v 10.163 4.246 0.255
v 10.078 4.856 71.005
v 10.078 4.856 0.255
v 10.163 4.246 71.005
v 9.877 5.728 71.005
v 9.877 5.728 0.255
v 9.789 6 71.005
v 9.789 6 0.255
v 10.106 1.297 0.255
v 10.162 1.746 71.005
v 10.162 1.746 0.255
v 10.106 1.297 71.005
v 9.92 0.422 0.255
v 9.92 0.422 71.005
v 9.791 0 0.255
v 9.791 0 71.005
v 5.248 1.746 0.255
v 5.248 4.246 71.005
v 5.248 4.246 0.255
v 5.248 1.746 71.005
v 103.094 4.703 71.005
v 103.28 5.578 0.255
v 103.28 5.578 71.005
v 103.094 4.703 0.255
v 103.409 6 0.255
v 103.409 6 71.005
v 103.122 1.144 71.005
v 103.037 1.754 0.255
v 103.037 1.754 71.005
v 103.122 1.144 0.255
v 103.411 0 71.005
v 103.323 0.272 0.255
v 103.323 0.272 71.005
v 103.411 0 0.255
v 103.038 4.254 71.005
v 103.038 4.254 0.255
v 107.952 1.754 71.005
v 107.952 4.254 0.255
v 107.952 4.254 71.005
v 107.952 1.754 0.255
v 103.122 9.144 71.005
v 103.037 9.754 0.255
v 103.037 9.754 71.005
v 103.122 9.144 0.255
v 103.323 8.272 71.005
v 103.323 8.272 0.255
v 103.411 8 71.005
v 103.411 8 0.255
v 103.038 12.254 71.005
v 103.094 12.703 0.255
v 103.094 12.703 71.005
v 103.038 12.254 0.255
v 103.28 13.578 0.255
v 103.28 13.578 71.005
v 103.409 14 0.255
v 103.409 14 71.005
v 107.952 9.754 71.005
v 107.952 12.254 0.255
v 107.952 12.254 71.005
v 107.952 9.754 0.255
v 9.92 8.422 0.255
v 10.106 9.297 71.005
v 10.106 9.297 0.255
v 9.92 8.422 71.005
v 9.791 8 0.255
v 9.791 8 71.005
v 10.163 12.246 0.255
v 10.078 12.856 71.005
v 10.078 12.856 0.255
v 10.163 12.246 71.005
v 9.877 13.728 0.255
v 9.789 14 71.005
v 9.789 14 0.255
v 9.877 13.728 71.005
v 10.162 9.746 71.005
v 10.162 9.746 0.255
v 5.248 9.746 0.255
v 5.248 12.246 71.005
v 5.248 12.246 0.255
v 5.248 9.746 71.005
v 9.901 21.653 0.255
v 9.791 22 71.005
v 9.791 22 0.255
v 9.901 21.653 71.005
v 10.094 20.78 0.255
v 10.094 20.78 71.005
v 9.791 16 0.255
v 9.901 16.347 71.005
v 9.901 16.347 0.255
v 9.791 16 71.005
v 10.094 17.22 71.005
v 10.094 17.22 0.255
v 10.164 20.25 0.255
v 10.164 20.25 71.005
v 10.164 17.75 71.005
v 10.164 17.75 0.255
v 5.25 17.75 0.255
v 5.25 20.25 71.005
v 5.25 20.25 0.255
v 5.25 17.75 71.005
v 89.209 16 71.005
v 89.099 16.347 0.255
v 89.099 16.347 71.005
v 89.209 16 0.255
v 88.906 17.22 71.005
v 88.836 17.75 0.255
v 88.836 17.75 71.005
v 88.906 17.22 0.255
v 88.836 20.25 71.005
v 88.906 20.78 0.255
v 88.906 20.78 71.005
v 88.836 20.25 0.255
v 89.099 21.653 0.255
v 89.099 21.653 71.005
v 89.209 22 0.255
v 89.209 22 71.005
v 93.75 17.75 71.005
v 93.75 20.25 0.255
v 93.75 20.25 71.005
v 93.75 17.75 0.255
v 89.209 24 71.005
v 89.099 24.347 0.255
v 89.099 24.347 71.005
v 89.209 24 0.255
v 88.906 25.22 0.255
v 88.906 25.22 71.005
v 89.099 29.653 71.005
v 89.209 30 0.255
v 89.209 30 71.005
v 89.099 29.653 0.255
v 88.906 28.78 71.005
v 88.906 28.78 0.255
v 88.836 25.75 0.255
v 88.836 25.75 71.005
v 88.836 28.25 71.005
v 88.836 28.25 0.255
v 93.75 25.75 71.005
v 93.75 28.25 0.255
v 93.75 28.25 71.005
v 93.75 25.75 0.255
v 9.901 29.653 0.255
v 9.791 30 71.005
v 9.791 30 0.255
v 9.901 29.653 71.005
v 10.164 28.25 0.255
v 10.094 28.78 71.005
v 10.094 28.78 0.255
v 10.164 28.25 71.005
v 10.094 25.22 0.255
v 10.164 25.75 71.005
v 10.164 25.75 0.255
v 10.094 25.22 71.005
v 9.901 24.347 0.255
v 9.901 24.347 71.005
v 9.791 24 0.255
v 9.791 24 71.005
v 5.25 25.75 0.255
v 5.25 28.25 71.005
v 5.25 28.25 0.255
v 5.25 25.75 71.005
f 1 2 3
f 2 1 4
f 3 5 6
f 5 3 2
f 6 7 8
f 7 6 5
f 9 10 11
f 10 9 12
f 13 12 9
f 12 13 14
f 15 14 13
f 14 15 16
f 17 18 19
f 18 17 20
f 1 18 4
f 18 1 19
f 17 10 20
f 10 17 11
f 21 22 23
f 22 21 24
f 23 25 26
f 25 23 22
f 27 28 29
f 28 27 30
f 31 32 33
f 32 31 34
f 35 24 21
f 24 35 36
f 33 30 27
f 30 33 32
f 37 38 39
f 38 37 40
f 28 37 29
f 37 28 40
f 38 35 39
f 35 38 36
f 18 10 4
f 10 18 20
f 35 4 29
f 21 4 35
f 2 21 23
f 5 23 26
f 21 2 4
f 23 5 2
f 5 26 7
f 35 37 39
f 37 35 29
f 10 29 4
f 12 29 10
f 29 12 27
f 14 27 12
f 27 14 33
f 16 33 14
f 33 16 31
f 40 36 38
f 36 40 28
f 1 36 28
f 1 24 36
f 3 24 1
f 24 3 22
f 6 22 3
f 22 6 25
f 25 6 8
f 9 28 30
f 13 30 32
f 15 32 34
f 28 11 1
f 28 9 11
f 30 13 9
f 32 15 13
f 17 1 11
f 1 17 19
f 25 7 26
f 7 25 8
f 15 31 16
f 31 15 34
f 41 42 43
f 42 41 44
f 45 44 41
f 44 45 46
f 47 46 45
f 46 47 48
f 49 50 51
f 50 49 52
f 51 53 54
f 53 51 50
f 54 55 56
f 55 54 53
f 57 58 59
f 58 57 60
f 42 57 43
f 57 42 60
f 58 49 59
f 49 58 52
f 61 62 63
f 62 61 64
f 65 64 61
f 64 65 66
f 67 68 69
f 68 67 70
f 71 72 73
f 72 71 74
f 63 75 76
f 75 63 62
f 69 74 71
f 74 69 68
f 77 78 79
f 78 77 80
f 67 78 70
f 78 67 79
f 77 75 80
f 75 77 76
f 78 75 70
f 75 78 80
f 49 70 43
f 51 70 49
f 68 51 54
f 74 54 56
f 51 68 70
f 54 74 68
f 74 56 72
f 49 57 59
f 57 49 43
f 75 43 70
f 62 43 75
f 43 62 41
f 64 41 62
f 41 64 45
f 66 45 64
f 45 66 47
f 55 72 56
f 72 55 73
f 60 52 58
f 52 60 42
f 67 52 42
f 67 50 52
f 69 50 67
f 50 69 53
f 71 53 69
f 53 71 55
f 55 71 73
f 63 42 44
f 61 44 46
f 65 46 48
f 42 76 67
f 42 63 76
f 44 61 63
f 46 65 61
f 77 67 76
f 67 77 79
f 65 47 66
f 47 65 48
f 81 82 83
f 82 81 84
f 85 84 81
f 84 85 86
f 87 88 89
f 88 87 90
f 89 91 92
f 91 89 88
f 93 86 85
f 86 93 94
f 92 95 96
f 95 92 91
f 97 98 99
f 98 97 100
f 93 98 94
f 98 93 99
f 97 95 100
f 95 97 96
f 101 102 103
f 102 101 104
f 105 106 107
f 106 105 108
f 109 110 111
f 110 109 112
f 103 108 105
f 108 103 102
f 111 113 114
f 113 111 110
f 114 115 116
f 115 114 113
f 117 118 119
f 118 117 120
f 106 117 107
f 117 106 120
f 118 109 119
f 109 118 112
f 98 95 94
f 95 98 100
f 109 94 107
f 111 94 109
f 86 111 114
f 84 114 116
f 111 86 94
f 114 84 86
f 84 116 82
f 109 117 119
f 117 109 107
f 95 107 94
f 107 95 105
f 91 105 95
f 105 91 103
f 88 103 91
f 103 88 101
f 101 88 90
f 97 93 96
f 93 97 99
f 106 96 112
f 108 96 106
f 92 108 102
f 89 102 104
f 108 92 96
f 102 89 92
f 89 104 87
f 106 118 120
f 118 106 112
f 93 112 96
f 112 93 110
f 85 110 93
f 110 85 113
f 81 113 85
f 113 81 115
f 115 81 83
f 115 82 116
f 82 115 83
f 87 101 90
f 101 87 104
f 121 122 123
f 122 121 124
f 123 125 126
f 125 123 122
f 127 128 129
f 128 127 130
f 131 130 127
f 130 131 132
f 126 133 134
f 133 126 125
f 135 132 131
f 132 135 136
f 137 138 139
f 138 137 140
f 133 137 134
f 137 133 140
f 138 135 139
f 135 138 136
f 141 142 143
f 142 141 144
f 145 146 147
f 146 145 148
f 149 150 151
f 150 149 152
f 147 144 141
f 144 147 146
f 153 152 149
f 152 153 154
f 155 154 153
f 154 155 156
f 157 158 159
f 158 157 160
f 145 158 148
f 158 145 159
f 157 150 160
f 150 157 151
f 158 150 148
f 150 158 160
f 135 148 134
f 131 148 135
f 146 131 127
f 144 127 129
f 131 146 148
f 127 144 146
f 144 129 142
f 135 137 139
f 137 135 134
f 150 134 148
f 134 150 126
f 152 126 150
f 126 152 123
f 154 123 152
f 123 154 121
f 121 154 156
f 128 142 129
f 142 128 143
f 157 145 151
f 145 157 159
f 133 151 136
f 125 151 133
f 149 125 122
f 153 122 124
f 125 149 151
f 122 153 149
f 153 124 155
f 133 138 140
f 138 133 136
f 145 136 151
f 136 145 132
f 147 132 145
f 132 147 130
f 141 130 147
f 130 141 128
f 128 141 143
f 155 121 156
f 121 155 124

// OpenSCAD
union(){
	translate([56.60, 3.00, 35.63]){
	rotate(0.46,[0,0,1]){
	translate([0.00, 0.00, 0.00]){
	scale([1.000, 1.000, 70.750]){
	difference(){
	rotate(-0.46,[0,0,1]){
	cube([113.20,6.00,1.00], true);
}	translate([-56.60, 0.45, -37.50]){
	translate([0.00, 0.00, 39.50]){
	scale([1.000, 1.000, 71.000]){
	difference(){
	translate([0.00, 0.00, 0.00]){
	cylinder(h = 1.000, r = 10.250, center = true, $fa = 5, $fs = 0.01);
}	rotate(-0.46,[0,0,1]){
	translate([10.25, 0.00, 0.00]){
	cube([10.00,2.50,4.00], true);
}}}}}}	translate([56.60, -0.45, -37.50]){
	translate([0.00, 0.00, 39.50]){
	scale([1.000, 1.000, 71.000]){
	difference(){
	translate([0.00, 0.00, 0.00]){
	cylinder(h = 1.000, r = 10.250, center = true, $fa = 5, $fs = 0.01);
}	rotate(179.54,[0,0,1]){
	translate([10.25, 0.00, 0.00]){
	cube([10.00,2.50,4.00], true);
}}}}}}}}}}}	translate([56.60, 11.00, 35.63]){
	rotate(-179.54,[0,0,1]){
	translate([0.00, 0.00, 0.00]){
	scale([1.000, 1.000, 70.750]){
	difference(){
	rotate(179.54,[0,0,1]){
	cube([113.20,6.00,1.00], true);
}	translate([56.60, -0.45, -37.50]){
	translate([0.00, 0.00, 39.50]){
	scale([1.000, 1.000, 71.000]){
	difference(){
	translate([0.00, 0.00, 0.00]){
	cylinder(h = 1.000, r = 10.250, center = true, $fa = 5, $fs = 0.01);
}	rotate(179.54,[0,0,1]){
	translate([10.25, 0.00, 0.00]){
	cube([10.00,2.50,4.00], true);
}}}}}}	translate([-56.60, 0.45, -37.50]){
	translate([0.00, 0.00, 39.50]){
	scale([1.000, 1.000, 71.000]){
	difference(){
	translate([0.00, 0.00, 0.00]){
	cylinder(h = 1.000, r = 10.250, center = true, $fa = 5, $fs = 0.01);
}	rotate(-0.46,[0,0,1]){
	translate([10.25, 0.00, 0.00]){
	cube([10.00,2.50,4.00], true);
}}}}}}}}}}}	translate([49.50, 19.00, 35.63]){
	rotate(90.00,[0,0,1]){
	translate([0.00, 0.00, 0.00]){
	scale([1.000, 1.000, 70.750]){
	difference(){
	rotate(-90.00,[0,0,1]){
	cube([99.00,6.00,1.00], true);
}	translate([-0.00, 49.50, -37.50]){
	translate([0.00, 0.00, 39.50]){
	scale([1.000, 1.000, 71.000]){
	difference(){
	translate([0.00, 0.00, 0.00]){
	cylinder(h = 1.000, r = 10.250, center = true, $fa = 5, $fs = 0.01);
}	rotate(-90.00,[0,0,1]){
	translate([10.25, 0.00, 0.00]){
	cube([10.00,2.50,4.00], true);
}}}}}}	translate([0.00, -49.50, -37.50]){
	translate([0.00, 0.00, 39.50]){
	scale([1.000, 1.000, 71.000]){
	difference(){
	translate([0.00, 0.00, 0.00]){
	cylinder(h = 1.000, r = 10.250, center = true, $fa = 5, $fs = 0.01);
}	rotate(90.00,[0,0,1]){
	translate([10.25, 0.00, 0.00]){
	cube([10.00,2.50,4.00], true);
}}}}}}}}}}}	translate([49.50, 27.00, 35.63]){
	rotate(-90.00,[0,0,1]){
	translate([0.00, 0.00, 0.00]){
	scale([1.000, 1.000, 70.750]){
	difference(){
	rotate(90.00,[0,0,1]){
	cube([99.00,6.00,1.00], true);
}	translate([-0.00, -49.50, -37.50]){
	translate([0.00, 0.00, 39.50]){
	scale([1.000, 1.000, 71.000]){
	difference(){
	translate([0.00, 0.00, 0.00]){
	cylinder(h = 1.000, r = 10.250, center = true, $fa = 5, $fs = 0.01);
}	rotate(90.00,[0,0,1]){
	translate([10.25, 0.00, 0.00]){
	cube([10.00,2.50,4.00], true);
}}}}}}	translate([0.00, 49.50, -37.50]){
	translate([0.00, 0.00, 39.50]){
	scale([1.000, 1.000, 71.000]){
	difference(){
	translate([0.00, 0.00, 0.00]){
	cylinder(h = 1.000, r = 10.250, center = true, $fa = 5, $fs = 0.01);
}	rotate(-90.00,[0,0,1]){
	translate([10.25, 0.00, 0.00]){
	cube([10.00,2.50,4.00], true);
}}}}}}}}}}}}
